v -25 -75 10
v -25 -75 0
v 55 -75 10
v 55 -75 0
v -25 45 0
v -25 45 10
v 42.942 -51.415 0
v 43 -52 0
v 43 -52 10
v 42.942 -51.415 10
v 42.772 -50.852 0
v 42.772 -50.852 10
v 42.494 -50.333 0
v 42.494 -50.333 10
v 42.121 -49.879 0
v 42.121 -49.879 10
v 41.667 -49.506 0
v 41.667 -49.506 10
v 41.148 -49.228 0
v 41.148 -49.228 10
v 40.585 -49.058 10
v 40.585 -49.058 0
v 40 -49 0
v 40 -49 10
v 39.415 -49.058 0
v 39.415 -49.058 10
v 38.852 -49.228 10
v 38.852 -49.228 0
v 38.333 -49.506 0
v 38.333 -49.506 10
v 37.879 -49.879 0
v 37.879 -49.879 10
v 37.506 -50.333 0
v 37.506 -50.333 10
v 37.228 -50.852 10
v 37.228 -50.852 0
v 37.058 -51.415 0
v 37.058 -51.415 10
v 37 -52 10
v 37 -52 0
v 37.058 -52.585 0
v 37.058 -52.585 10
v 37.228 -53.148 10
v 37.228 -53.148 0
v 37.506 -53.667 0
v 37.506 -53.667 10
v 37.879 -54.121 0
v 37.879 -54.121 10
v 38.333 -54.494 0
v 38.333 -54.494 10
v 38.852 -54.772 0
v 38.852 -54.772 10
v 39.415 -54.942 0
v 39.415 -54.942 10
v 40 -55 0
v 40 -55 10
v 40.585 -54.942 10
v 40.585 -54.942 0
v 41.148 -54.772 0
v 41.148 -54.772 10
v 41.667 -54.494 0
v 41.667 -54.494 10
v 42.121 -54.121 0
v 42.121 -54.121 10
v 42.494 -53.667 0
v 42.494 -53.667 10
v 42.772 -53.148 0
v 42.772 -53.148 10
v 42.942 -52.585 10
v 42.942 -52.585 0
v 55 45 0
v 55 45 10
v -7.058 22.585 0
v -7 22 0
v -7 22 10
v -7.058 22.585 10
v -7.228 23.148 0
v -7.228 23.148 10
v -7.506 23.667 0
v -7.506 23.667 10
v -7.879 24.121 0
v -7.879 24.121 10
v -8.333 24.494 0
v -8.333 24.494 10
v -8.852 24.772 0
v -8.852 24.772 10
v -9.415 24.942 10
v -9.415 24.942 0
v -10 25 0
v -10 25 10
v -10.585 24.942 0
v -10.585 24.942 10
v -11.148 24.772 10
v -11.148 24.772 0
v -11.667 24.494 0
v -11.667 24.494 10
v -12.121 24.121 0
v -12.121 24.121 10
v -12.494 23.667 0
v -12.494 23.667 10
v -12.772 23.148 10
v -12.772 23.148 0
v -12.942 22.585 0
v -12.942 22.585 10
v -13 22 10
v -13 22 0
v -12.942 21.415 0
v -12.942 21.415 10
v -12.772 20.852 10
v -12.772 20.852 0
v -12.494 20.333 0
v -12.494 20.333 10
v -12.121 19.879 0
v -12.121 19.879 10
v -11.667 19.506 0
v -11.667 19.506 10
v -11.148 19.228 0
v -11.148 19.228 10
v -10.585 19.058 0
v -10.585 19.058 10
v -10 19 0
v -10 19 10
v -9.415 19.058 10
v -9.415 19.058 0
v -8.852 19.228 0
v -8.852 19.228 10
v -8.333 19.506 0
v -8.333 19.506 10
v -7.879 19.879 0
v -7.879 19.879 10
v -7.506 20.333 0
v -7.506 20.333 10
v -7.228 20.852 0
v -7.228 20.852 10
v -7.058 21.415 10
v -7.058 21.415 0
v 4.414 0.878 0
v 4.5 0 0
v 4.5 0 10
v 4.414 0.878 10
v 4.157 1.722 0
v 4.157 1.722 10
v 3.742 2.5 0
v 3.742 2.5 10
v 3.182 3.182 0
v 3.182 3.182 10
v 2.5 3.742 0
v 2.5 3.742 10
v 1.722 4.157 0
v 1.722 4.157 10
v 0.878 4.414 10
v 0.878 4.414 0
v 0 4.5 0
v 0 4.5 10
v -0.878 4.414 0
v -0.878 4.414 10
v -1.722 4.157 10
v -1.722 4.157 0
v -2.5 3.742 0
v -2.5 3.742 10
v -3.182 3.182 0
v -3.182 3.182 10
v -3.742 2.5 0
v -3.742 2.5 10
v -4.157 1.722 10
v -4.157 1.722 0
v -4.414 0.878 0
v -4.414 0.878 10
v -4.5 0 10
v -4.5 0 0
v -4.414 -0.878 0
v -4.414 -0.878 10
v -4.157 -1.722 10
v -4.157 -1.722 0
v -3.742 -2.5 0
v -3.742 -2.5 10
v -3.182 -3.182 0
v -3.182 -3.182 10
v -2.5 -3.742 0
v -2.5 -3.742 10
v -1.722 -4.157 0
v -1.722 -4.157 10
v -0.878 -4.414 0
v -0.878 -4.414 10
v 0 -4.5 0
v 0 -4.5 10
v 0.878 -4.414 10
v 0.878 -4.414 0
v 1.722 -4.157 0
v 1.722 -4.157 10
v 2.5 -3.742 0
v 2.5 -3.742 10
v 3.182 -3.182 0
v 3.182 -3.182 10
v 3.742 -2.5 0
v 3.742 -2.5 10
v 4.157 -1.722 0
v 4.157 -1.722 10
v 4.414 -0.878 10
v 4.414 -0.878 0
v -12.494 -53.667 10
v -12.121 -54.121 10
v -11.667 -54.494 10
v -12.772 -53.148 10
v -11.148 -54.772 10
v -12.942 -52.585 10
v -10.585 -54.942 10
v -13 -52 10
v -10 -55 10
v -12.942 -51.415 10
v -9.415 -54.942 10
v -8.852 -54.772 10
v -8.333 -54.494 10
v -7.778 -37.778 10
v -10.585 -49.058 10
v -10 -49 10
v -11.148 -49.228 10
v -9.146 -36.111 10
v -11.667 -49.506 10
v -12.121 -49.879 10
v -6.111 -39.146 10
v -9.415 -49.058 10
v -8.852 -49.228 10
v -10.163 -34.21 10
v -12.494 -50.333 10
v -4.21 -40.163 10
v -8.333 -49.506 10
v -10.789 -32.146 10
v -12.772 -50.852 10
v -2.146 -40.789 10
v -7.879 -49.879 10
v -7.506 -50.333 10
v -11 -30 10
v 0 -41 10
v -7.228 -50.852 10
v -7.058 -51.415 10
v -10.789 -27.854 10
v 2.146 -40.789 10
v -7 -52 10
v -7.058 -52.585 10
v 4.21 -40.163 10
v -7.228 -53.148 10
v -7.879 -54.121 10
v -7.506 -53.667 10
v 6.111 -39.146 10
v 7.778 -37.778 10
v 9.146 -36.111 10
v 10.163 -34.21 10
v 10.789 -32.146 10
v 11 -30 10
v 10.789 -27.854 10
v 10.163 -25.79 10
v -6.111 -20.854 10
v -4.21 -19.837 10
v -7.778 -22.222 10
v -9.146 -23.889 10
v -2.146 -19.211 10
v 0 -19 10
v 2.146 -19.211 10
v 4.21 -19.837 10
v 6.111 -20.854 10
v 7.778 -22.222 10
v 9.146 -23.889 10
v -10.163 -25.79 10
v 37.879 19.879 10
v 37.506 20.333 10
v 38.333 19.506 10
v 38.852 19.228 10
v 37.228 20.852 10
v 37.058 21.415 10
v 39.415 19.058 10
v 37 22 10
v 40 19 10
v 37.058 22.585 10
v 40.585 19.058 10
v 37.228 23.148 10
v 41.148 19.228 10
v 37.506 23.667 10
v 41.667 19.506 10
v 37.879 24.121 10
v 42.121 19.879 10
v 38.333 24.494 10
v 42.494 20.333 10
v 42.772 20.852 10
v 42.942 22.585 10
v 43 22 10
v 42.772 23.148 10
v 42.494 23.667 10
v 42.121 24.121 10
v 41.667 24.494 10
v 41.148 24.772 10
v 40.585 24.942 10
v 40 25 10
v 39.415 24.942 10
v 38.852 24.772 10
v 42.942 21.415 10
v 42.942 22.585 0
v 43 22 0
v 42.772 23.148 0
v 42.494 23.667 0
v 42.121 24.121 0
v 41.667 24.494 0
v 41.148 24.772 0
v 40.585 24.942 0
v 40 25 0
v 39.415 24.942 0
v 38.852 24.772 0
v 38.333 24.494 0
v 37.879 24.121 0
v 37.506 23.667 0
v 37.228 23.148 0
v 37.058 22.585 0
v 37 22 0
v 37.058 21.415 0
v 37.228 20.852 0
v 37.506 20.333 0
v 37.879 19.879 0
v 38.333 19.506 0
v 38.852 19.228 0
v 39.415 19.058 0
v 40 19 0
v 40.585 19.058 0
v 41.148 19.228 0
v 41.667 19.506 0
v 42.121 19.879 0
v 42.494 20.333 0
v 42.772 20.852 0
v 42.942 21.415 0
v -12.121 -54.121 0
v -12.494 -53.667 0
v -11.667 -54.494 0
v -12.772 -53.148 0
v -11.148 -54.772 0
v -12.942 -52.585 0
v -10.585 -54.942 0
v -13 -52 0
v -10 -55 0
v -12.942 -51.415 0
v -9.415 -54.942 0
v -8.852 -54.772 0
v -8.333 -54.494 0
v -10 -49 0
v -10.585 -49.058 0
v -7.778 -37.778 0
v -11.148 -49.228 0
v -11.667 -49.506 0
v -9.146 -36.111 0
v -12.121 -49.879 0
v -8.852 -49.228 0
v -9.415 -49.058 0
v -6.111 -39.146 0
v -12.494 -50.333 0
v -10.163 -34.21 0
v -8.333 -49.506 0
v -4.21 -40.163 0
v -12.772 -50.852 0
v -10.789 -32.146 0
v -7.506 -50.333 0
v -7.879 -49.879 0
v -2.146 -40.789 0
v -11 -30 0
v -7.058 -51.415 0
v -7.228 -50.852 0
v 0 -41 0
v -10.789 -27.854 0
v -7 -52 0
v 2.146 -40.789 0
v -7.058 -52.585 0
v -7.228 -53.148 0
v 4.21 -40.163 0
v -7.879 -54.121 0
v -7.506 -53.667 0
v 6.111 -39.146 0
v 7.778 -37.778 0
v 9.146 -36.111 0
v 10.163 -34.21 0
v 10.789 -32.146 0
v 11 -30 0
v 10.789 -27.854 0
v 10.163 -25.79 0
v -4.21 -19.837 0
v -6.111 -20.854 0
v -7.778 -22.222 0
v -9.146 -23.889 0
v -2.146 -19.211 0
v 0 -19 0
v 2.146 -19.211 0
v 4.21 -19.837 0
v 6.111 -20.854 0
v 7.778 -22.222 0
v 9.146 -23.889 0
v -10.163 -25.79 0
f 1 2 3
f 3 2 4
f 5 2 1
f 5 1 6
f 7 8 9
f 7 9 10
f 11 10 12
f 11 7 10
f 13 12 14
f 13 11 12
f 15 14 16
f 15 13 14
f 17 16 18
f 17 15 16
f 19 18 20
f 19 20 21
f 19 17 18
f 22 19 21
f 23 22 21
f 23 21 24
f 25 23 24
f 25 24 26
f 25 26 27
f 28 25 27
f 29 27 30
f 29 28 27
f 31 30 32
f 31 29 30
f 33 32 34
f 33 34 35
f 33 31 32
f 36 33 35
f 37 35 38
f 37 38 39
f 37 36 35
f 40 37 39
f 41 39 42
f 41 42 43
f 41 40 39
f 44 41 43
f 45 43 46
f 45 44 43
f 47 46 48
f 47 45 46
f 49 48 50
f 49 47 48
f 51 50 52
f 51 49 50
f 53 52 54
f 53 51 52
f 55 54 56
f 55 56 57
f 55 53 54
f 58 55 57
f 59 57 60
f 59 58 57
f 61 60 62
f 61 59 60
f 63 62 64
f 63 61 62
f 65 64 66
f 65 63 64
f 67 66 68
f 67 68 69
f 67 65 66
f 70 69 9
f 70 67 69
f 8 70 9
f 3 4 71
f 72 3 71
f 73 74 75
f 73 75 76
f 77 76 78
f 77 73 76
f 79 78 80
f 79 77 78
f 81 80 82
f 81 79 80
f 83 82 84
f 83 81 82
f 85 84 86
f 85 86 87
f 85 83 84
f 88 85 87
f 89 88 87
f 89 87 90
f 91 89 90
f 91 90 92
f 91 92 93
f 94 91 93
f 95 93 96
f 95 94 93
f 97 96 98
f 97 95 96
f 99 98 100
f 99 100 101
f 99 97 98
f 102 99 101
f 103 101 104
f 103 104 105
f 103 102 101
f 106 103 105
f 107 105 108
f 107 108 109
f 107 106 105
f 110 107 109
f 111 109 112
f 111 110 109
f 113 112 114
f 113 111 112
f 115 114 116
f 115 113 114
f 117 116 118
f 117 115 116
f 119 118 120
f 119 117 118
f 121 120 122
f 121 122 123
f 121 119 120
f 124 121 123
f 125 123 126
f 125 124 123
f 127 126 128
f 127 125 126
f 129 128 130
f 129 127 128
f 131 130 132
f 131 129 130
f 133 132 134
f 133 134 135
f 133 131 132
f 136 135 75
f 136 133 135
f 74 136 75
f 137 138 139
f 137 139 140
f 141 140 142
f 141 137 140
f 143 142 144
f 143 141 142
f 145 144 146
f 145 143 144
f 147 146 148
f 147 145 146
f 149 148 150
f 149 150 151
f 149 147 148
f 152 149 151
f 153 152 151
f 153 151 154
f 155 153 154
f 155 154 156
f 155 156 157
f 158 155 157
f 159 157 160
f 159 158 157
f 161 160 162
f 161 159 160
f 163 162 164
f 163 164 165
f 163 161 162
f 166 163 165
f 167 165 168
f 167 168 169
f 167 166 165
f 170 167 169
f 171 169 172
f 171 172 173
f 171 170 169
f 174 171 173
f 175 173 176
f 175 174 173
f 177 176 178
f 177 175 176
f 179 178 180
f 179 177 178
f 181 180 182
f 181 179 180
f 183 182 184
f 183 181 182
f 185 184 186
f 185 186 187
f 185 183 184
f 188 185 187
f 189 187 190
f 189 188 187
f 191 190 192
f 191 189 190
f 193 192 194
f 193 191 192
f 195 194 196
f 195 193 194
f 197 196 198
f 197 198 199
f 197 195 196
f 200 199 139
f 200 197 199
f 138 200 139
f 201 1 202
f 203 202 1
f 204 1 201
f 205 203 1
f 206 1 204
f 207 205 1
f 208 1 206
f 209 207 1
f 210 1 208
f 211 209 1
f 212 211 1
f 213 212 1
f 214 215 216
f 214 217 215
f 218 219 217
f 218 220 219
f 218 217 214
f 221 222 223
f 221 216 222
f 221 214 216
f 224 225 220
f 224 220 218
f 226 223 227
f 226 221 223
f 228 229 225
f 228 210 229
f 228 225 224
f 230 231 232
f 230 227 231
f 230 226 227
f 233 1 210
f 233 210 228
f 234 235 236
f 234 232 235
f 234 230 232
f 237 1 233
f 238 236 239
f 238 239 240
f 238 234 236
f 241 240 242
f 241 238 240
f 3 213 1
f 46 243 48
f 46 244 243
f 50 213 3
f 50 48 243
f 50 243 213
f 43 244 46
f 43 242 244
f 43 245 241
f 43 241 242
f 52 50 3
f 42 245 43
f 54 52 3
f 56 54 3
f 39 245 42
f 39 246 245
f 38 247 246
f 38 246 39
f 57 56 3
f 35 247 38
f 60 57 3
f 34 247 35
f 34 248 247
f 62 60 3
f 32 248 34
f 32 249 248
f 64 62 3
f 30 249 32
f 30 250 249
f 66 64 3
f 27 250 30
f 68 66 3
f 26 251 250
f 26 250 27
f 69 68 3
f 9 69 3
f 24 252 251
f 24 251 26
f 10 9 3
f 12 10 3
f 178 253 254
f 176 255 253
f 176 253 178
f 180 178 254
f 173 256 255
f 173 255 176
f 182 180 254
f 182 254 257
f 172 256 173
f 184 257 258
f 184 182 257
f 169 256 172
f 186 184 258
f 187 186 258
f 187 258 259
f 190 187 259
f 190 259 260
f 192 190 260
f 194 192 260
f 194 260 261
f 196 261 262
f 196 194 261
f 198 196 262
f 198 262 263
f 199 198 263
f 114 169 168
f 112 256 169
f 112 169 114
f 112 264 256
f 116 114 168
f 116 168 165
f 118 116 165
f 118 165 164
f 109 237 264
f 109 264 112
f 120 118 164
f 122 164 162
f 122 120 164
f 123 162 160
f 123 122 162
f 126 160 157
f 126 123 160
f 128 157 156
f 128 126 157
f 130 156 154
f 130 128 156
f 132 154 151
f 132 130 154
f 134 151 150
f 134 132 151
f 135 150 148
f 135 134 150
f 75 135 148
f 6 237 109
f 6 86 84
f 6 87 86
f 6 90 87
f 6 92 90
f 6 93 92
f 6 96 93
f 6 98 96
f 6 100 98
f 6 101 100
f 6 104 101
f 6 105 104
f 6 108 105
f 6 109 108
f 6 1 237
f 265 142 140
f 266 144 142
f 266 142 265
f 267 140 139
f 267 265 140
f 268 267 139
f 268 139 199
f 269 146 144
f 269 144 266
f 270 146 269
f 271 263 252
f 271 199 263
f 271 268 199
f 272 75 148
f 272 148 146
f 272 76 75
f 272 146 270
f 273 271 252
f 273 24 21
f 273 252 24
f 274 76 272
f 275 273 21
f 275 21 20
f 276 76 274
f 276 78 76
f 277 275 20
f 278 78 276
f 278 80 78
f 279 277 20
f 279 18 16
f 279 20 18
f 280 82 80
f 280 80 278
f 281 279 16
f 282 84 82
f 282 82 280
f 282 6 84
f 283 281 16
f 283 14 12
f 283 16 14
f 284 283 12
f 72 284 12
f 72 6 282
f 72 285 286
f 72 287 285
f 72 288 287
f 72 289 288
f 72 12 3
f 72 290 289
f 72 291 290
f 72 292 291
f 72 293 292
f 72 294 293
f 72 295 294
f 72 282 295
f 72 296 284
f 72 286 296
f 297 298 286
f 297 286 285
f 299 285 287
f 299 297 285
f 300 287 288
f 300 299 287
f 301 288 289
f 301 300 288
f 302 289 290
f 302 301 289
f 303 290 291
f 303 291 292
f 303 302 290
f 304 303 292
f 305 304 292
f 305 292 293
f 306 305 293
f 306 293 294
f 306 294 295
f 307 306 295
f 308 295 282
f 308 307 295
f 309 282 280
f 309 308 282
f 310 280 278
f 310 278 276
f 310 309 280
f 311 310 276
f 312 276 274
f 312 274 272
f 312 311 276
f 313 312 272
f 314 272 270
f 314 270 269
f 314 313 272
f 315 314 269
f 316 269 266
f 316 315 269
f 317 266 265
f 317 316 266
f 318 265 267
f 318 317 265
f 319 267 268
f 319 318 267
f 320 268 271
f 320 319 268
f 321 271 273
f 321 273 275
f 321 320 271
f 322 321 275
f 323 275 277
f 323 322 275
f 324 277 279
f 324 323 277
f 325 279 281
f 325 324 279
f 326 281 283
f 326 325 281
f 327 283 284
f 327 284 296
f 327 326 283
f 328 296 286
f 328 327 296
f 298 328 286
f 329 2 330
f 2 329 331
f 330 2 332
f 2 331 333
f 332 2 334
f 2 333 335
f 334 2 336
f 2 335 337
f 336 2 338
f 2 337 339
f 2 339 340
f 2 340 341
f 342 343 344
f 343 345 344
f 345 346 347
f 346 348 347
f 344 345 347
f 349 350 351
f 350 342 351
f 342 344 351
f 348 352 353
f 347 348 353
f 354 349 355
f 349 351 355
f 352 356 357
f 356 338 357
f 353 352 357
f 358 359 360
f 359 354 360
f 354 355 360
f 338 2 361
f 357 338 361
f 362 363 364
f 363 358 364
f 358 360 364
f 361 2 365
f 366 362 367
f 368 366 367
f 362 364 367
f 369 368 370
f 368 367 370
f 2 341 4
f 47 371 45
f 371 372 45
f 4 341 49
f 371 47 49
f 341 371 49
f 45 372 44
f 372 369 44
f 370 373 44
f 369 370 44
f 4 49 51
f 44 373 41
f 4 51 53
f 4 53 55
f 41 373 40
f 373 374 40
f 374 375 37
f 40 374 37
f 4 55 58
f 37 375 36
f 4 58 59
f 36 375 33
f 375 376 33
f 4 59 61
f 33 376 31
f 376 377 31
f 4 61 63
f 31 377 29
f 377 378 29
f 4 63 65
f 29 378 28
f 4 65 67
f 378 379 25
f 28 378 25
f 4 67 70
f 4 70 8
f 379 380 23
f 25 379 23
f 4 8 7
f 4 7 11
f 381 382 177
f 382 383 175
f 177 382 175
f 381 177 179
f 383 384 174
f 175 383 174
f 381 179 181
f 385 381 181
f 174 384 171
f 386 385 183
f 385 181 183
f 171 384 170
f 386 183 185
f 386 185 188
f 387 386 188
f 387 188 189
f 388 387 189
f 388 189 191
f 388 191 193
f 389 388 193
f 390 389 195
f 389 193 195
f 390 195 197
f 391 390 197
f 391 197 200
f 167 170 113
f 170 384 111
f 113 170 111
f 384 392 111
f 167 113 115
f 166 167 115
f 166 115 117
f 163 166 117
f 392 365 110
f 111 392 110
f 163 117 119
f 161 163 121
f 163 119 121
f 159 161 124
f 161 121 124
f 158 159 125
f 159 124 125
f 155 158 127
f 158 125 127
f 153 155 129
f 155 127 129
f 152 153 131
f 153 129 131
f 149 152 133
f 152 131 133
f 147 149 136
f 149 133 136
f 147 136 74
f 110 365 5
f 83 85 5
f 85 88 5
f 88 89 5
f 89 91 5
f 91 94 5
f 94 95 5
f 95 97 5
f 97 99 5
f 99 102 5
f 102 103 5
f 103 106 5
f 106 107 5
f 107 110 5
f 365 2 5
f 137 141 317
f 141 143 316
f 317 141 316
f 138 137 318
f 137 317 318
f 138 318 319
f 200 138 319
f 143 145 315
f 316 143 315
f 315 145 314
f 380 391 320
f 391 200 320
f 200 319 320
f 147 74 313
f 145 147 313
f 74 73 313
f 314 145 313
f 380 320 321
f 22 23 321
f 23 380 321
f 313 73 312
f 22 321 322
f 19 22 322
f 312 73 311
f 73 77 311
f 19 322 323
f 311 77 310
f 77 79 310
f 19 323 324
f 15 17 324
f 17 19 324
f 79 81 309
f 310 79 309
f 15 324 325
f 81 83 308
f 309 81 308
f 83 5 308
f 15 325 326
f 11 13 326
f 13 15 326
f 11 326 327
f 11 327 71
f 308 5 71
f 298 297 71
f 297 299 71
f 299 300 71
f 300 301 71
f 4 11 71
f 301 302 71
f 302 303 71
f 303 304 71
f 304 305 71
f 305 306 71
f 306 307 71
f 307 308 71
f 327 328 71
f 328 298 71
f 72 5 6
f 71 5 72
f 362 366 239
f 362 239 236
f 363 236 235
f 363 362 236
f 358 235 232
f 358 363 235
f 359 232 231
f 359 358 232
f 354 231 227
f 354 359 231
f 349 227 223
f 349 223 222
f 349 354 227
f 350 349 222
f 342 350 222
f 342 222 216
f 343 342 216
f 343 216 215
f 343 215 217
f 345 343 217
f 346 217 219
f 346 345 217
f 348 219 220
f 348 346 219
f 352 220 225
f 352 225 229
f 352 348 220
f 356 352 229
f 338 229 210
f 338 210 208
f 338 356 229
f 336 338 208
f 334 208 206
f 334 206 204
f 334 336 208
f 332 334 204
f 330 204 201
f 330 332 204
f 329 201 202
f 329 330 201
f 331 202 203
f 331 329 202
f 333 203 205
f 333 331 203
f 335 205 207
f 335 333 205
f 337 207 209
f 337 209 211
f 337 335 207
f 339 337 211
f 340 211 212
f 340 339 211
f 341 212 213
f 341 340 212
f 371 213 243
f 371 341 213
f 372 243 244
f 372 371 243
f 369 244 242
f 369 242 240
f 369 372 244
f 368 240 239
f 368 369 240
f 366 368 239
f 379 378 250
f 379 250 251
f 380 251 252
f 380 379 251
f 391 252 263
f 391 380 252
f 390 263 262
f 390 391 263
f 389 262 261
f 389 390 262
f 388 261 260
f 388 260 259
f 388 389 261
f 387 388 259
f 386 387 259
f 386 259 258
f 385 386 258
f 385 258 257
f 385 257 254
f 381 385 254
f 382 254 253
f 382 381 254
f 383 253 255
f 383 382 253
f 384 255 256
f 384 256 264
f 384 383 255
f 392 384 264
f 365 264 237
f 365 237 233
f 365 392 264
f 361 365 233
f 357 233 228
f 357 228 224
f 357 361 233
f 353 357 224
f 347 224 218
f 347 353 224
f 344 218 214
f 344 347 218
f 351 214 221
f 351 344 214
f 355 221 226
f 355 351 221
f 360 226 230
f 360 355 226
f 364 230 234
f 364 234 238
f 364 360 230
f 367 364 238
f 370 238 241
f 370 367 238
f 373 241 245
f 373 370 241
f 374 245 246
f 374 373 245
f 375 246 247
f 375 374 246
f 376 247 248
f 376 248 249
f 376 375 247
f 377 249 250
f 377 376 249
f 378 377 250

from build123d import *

# Parameters (mm, degrees)
SKETCH_W   = 80
SKETCH_H   = 120
SKETCH_R   = 4.5
SKETCH_R_2 = 11
SKETCH_R_3 = 3
PAD_DEPTH  = 10


with BuildPart() as part:
    # Sketch → Pad (new body)
    with BuildSketch(Plane.XY):
        with Locations((15, -15)):
            Rectangle(SKETCH_W, SKETCH_H)
        Circle(SKETCH_R, mode=Mode.SUBTRACT)
        with Locations((0, -30)):
            Circle(SKETCH_R_2, mode=Mode.SUBTRACT)
        with Locations((-10, -52)):
            Circle(SKETCH_R_3, mode=Mode.SUBTRACT)
        with Locations((40, -52)):
            Circle(SKETCH_R_3, mode=Mode.SUBTRACT)
        with Locations((40, 22)):
            Circle(SKETCH_R_3, mode=Mode.SUBTRACT)
        with Locations((-10, 22)):
            Circle(SKETCH_R_3, mode=Mode.SUBTRACT)
    extrude(amount=PAD_DEPTH)


solid = part.part
